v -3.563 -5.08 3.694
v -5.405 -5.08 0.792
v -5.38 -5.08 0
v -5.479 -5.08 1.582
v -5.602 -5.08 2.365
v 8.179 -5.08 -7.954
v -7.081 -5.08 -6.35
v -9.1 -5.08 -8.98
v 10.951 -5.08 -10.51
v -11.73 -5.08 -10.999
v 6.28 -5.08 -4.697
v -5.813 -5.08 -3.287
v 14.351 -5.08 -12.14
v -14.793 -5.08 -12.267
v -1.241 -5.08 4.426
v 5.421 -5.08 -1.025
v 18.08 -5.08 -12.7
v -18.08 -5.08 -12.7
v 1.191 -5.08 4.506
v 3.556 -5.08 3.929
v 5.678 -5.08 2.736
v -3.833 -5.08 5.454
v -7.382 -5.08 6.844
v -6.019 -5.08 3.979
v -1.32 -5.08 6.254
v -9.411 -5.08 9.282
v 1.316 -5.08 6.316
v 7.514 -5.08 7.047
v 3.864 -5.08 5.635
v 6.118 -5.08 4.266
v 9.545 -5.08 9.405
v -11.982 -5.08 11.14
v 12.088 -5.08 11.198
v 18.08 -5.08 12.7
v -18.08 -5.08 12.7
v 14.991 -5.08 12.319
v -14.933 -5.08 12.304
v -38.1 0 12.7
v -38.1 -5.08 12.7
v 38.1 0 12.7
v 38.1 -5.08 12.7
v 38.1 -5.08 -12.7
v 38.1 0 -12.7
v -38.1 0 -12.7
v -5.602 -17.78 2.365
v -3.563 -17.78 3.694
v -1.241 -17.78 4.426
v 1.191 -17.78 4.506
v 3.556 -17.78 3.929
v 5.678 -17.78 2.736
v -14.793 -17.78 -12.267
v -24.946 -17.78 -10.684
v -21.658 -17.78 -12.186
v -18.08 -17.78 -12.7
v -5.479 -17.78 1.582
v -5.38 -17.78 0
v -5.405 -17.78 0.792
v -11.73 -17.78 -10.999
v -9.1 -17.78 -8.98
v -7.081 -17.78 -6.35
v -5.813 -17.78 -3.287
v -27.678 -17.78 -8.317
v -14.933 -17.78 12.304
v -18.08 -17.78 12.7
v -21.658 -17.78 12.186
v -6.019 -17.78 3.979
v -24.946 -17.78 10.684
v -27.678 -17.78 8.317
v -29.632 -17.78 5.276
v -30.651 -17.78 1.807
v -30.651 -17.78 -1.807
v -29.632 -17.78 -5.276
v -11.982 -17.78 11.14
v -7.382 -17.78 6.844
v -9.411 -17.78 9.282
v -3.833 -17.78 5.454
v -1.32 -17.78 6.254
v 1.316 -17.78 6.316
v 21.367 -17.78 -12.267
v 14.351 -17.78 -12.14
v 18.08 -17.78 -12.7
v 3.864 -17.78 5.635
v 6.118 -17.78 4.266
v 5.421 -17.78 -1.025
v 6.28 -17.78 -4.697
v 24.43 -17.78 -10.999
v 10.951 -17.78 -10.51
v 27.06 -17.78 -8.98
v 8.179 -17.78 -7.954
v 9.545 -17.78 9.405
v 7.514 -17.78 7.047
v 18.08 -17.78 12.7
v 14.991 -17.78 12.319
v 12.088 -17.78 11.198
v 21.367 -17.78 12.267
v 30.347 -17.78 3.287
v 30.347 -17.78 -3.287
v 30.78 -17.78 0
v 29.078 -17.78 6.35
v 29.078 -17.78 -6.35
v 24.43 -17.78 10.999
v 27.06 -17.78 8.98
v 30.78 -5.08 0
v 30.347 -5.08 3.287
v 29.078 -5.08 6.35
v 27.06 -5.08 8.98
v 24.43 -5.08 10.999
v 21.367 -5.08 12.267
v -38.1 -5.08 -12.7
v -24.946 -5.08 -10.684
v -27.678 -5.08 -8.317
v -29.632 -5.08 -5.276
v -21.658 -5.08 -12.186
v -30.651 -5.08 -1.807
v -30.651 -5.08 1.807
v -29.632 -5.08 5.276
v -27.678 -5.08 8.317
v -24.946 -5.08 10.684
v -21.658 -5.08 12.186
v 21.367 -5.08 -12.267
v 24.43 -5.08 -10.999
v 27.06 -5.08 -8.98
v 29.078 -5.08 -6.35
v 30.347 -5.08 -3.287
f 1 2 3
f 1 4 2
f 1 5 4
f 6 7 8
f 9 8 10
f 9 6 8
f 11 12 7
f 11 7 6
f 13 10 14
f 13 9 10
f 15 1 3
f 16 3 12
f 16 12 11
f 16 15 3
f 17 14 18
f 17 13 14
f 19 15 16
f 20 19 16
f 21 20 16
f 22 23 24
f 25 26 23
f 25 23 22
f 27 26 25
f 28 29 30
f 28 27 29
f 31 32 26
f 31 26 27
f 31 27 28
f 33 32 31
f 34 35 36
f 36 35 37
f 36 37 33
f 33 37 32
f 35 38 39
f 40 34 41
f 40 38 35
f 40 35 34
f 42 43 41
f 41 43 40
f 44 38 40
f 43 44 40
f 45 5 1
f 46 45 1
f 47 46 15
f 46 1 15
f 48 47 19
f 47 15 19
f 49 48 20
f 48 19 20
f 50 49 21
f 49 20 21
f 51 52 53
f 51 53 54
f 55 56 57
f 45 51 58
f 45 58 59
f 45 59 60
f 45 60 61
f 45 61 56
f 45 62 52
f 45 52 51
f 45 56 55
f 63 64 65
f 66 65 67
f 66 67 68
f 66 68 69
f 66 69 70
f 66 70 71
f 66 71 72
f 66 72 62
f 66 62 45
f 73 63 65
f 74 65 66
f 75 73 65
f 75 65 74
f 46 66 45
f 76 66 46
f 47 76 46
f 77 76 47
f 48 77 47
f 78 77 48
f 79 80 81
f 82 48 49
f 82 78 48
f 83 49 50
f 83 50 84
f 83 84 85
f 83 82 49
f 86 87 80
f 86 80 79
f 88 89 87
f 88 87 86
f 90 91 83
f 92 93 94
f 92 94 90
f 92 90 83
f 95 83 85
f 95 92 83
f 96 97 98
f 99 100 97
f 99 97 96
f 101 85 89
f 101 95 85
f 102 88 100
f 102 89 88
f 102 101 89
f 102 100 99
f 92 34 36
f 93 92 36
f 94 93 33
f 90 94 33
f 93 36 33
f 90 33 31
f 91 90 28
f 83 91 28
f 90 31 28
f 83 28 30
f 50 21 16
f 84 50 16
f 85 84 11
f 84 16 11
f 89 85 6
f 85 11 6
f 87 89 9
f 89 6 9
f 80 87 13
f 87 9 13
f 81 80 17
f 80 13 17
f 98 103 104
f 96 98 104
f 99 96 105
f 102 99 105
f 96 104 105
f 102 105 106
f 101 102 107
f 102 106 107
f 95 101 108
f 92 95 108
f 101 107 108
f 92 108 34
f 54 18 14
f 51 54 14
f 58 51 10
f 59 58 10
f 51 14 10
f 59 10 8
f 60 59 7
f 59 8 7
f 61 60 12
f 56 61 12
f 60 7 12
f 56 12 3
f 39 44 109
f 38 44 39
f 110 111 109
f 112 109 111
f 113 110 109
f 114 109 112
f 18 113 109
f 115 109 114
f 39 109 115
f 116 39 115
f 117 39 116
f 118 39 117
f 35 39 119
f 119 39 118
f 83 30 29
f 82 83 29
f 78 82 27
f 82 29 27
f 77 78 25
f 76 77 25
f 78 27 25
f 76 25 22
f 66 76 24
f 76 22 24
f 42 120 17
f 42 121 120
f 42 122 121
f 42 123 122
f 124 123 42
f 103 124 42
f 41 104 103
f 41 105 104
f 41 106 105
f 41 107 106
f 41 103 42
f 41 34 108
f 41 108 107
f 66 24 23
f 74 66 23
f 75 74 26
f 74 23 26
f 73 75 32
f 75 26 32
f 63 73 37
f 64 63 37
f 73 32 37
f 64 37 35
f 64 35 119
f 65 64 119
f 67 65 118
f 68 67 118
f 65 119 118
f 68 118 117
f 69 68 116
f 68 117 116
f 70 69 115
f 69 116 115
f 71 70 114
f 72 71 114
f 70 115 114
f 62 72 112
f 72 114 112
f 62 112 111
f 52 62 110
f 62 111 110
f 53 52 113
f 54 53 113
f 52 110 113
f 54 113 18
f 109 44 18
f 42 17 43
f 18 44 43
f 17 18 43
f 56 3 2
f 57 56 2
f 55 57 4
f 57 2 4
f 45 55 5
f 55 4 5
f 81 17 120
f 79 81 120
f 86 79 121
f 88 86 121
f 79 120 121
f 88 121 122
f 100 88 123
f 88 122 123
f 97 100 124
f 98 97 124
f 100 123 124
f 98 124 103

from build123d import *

# Parameters (mm, degrees)
F0_W     = 76.2
F0_H     = 25.4
F1_DEPTH = 5.08
F3_DEPTH = 12.7


with BuildPart() as f1:
    # F0 (on Front) → F1 (new body)
    with BuildSketch(Plane.XZ):
        Rectangle(F0_W, F0_H)
    extrude(amount=F1_DEPTH)

    # F2 (on face) → F3 (join)
    with BuildSketch(Plane.XZ.offset(5.08)):
        with BuildLine():
            ThreePointArc((-18.079832, -12.7), (-9.099576, -8.980256), (-5.379832, 0))
            ThreePointArc((-5.379832, 0), (-5.435483, 1.187617), (-5.601948, 2.364825))
            ThreePointArc((-5.601948, 2.364825), (-5.784143, 3.178999), (-6.019403, 3.979452))
            ThreePointArc((-6.019403, 3.979452), (-10.638362, 10.291478), (-18.079832, 12.7))
            ThreePointArc((-18.079832, 12.7), (-30.779832, 0), (-18.079832, -12.7))
        make_face()
        with BuildLine():
            ThreePointArc((-6.019403, 3.979452), (-5.784143, 3.178999), (-5.601948, 2.364825))
            ThreePointArc((-5.601948, 2.364825), (-0.027745, 4.54921), (5.678145, 2.736451))
            ThreePointArc((5.678145, 2.736451), (5.873958, 3.508082), (6.117731, 4.265928))
            ThreePointArc((6.117731, 4.265928), (-0.004095, 6.379128), (-6.019403, 3.979452))
        make_face()
        with BuildLine():
            ThreePointArc((6.117731, 4.265928), (5.873958, 3.508082), (5.678145, 2.736451))
            ThreePointArc((5.678145, 2.736451), (8.179253, -7.954152), (18.079832, -12.7))
            ThreePointArc((18.079832, -12.7), (27.060088, -8.980256), (30.779832, 0))
            ThreePointArc((30.779832, 0), (27.060088, 8.980256), (18.079832, 12.7))
            ThreePointArc((18.079832, 12.7), (10.761611, 10.379482), (6.117731, 4.265928))
        make_face()
    extrude(amount=F3_DEPTH)


solid = f1.part
